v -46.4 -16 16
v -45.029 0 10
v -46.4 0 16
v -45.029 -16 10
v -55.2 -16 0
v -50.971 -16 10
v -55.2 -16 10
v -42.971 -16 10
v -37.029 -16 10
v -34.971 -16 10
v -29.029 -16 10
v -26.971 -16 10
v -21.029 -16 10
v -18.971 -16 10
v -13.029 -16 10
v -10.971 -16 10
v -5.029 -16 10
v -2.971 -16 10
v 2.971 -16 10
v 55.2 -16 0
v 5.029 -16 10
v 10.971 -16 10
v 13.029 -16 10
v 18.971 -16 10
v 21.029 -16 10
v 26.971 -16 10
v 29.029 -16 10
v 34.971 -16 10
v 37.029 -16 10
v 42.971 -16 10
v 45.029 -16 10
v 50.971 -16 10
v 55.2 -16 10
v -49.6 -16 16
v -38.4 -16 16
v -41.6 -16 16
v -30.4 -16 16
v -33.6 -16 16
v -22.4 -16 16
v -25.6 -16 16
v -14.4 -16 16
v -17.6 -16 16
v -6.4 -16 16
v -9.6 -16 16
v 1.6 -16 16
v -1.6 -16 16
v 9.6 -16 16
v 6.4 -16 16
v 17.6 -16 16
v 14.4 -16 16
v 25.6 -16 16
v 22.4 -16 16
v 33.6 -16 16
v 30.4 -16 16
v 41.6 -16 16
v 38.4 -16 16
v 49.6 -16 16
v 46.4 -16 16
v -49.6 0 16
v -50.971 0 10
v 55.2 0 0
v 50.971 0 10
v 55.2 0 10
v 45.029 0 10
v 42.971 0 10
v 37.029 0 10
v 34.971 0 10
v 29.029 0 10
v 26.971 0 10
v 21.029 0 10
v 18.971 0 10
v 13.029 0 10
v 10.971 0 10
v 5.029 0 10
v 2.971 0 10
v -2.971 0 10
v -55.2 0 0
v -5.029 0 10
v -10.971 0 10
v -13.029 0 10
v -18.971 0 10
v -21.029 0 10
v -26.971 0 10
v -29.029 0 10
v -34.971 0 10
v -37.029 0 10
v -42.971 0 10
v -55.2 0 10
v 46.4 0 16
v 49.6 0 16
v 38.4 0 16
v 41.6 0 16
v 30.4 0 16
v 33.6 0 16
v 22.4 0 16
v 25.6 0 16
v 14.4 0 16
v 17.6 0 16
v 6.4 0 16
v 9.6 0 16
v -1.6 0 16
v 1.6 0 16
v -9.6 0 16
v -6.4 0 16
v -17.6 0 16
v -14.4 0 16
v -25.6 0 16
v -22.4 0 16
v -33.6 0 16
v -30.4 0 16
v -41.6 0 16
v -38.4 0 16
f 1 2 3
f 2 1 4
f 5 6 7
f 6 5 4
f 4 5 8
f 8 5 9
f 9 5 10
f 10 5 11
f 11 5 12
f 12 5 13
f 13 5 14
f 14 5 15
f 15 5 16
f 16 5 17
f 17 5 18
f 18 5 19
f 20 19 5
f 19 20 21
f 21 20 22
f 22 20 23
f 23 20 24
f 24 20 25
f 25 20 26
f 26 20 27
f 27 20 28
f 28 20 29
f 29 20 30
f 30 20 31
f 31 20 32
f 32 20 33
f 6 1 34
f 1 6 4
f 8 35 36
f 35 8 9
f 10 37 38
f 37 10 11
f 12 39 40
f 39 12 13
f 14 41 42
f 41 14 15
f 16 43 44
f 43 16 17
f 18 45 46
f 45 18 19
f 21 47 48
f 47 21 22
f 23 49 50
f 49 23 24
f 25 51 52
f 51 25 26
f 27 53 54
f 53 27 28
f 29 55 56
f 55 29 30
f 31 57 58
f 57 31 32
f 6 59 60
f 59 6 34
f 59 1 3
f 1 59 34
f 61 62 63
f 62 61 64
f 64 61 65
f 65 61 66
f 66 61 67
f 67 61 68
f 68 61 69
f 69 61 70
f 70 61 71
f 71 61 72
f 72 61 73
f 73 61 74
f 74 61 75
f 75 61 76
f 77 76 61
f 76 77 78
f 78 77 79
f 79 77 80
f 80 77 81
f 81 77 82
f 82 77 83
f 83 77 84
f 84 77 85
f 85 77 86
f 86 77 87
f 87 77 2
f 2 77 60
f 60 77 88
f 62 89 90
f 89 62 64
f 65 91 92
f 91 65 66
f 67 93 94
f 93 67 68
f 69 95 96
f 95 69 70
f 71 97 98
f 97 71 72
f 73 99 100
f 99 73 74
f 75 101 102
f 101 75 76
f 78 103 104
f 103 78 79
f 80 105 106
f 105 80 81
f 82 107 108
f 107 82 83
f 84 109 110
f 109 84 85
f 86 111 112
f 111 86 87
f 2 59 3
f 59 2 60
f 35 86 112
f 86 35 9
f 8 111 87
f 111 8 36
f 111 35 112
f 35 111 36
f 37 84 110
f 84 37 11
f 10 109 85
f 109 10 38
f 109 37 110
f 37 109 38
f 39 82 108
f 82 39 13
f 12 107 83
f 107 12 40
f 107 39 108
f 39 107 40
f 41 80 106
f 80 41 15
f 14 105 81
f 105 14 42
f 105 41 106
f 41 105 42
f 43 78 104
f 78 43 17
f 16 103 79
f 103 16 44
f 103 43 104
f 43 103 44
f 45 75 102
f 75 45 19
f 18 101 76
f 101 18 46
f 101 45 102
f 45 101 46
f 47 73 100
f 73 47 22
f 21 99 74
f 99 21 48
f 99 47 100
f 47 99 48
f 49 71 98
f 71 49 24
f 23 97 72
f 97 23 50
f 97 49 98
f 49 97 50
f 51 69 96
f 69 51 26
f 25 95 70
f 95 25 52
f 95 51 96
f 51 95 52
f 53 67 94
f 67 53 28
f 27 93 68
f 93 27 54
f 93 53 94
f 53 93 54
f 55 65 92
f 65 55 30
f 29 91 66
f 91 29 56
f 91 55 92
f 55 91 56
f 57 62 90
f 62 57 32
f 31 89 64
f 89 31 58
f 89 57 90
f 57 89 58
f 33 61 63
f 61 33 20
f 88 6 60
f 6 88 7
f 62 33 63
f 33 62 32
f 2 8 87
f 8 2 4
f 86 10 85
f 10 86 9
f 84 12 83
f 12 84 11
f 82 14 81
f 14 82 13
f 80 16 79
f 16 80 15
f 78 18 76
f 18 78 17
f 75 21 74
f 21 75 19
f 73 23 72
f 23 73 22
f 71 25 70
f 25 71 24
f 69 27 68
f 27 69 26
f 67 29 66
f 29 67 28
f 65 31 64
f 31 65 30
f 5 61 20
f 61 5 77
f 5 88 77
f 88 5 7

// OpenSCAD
$fn = 32;

// ----------------------------------------------------------------------
// Toothed rack, 13 teeth
// 8 mm pitch, 6 mm teeth
// ----------------------------------------------------------------------

// --- parameters (mm) ---
bar_w = 16;     // bar width (Y)
bar_h = 10;     // bar height (Z)
teeth = 13;     // number of teeth
pitch = 8;      // tooth pitch
tooth_h = 6;    // tooth height above the bar
root_w = 6.4;   // tooth width at the root
crest_w = 3.2;  // tooth width at the crest

// --- derived feature positions (mm) ---
span = (teeth - 1) * pitch;  // = 96   distance between the outer teeth
bar_l = span + root_w + 8;   // = 110.4   bar length: teeth plus 4 mm at each end
tooth_x = -span / 2;         // = -48   X of the first tooth
height = bar_h + tooth_h;    // = 16   overall height
feature_centers = [
  [tooth_x + 0 * pitch, -bar_w / 2],
  [tooth_x + 1 * pitch, -bar_w / 2],
  [tooth_x + 2 * pitch, -bar_w / 2],
  [tooth_x + 3 * pitch, -bar_w / 2],
  [tooth_x + 4 * pitch, -bar_w / 2],
  [tooth_x + 5 * pitch, -bar_w / 2],
  [tooth_x + 6 * pitch, -bar_w / 2],
  [tooth_x + 7 * pitch, -bar_w / 2],
  [tooth_x + 8 * pitch, -bar_w / 2],
  [tooth_x + 9 * pitch, -bar_w / 2],
  [tooth_x + 10 * pitch, -bar_w / 2],
  [tooth_x + 11 * pitch, -bar_w / 2],
  [tooth_x + 12 * pitch, -bar_w / 2]
];   // tooth centre line, drives the tooth loop

// bar with a rack of teeth, one extruded trapezoium per centre
module rack_tooth() {
  linear_extrude(height = bar_w)
    polygon(points = [
      [0, 0],
      [root_w, 0],
      [root_w / 2 + crest_w / 2, tooth_h + 1],
      [root_w / 2 - crest_w / 2, tooth_h + 1]
    ]);
}

union() {
  translate([-bar_l / 2, -bar_w, 0]) cube([bar_l, bar_w, bar_h]);
  for (centre = feature_centers)
    translate([centre[0] - root_w / 2, 0, bar_h - 1]) rotate([90, 0, 0]) rack_tooth();
}
